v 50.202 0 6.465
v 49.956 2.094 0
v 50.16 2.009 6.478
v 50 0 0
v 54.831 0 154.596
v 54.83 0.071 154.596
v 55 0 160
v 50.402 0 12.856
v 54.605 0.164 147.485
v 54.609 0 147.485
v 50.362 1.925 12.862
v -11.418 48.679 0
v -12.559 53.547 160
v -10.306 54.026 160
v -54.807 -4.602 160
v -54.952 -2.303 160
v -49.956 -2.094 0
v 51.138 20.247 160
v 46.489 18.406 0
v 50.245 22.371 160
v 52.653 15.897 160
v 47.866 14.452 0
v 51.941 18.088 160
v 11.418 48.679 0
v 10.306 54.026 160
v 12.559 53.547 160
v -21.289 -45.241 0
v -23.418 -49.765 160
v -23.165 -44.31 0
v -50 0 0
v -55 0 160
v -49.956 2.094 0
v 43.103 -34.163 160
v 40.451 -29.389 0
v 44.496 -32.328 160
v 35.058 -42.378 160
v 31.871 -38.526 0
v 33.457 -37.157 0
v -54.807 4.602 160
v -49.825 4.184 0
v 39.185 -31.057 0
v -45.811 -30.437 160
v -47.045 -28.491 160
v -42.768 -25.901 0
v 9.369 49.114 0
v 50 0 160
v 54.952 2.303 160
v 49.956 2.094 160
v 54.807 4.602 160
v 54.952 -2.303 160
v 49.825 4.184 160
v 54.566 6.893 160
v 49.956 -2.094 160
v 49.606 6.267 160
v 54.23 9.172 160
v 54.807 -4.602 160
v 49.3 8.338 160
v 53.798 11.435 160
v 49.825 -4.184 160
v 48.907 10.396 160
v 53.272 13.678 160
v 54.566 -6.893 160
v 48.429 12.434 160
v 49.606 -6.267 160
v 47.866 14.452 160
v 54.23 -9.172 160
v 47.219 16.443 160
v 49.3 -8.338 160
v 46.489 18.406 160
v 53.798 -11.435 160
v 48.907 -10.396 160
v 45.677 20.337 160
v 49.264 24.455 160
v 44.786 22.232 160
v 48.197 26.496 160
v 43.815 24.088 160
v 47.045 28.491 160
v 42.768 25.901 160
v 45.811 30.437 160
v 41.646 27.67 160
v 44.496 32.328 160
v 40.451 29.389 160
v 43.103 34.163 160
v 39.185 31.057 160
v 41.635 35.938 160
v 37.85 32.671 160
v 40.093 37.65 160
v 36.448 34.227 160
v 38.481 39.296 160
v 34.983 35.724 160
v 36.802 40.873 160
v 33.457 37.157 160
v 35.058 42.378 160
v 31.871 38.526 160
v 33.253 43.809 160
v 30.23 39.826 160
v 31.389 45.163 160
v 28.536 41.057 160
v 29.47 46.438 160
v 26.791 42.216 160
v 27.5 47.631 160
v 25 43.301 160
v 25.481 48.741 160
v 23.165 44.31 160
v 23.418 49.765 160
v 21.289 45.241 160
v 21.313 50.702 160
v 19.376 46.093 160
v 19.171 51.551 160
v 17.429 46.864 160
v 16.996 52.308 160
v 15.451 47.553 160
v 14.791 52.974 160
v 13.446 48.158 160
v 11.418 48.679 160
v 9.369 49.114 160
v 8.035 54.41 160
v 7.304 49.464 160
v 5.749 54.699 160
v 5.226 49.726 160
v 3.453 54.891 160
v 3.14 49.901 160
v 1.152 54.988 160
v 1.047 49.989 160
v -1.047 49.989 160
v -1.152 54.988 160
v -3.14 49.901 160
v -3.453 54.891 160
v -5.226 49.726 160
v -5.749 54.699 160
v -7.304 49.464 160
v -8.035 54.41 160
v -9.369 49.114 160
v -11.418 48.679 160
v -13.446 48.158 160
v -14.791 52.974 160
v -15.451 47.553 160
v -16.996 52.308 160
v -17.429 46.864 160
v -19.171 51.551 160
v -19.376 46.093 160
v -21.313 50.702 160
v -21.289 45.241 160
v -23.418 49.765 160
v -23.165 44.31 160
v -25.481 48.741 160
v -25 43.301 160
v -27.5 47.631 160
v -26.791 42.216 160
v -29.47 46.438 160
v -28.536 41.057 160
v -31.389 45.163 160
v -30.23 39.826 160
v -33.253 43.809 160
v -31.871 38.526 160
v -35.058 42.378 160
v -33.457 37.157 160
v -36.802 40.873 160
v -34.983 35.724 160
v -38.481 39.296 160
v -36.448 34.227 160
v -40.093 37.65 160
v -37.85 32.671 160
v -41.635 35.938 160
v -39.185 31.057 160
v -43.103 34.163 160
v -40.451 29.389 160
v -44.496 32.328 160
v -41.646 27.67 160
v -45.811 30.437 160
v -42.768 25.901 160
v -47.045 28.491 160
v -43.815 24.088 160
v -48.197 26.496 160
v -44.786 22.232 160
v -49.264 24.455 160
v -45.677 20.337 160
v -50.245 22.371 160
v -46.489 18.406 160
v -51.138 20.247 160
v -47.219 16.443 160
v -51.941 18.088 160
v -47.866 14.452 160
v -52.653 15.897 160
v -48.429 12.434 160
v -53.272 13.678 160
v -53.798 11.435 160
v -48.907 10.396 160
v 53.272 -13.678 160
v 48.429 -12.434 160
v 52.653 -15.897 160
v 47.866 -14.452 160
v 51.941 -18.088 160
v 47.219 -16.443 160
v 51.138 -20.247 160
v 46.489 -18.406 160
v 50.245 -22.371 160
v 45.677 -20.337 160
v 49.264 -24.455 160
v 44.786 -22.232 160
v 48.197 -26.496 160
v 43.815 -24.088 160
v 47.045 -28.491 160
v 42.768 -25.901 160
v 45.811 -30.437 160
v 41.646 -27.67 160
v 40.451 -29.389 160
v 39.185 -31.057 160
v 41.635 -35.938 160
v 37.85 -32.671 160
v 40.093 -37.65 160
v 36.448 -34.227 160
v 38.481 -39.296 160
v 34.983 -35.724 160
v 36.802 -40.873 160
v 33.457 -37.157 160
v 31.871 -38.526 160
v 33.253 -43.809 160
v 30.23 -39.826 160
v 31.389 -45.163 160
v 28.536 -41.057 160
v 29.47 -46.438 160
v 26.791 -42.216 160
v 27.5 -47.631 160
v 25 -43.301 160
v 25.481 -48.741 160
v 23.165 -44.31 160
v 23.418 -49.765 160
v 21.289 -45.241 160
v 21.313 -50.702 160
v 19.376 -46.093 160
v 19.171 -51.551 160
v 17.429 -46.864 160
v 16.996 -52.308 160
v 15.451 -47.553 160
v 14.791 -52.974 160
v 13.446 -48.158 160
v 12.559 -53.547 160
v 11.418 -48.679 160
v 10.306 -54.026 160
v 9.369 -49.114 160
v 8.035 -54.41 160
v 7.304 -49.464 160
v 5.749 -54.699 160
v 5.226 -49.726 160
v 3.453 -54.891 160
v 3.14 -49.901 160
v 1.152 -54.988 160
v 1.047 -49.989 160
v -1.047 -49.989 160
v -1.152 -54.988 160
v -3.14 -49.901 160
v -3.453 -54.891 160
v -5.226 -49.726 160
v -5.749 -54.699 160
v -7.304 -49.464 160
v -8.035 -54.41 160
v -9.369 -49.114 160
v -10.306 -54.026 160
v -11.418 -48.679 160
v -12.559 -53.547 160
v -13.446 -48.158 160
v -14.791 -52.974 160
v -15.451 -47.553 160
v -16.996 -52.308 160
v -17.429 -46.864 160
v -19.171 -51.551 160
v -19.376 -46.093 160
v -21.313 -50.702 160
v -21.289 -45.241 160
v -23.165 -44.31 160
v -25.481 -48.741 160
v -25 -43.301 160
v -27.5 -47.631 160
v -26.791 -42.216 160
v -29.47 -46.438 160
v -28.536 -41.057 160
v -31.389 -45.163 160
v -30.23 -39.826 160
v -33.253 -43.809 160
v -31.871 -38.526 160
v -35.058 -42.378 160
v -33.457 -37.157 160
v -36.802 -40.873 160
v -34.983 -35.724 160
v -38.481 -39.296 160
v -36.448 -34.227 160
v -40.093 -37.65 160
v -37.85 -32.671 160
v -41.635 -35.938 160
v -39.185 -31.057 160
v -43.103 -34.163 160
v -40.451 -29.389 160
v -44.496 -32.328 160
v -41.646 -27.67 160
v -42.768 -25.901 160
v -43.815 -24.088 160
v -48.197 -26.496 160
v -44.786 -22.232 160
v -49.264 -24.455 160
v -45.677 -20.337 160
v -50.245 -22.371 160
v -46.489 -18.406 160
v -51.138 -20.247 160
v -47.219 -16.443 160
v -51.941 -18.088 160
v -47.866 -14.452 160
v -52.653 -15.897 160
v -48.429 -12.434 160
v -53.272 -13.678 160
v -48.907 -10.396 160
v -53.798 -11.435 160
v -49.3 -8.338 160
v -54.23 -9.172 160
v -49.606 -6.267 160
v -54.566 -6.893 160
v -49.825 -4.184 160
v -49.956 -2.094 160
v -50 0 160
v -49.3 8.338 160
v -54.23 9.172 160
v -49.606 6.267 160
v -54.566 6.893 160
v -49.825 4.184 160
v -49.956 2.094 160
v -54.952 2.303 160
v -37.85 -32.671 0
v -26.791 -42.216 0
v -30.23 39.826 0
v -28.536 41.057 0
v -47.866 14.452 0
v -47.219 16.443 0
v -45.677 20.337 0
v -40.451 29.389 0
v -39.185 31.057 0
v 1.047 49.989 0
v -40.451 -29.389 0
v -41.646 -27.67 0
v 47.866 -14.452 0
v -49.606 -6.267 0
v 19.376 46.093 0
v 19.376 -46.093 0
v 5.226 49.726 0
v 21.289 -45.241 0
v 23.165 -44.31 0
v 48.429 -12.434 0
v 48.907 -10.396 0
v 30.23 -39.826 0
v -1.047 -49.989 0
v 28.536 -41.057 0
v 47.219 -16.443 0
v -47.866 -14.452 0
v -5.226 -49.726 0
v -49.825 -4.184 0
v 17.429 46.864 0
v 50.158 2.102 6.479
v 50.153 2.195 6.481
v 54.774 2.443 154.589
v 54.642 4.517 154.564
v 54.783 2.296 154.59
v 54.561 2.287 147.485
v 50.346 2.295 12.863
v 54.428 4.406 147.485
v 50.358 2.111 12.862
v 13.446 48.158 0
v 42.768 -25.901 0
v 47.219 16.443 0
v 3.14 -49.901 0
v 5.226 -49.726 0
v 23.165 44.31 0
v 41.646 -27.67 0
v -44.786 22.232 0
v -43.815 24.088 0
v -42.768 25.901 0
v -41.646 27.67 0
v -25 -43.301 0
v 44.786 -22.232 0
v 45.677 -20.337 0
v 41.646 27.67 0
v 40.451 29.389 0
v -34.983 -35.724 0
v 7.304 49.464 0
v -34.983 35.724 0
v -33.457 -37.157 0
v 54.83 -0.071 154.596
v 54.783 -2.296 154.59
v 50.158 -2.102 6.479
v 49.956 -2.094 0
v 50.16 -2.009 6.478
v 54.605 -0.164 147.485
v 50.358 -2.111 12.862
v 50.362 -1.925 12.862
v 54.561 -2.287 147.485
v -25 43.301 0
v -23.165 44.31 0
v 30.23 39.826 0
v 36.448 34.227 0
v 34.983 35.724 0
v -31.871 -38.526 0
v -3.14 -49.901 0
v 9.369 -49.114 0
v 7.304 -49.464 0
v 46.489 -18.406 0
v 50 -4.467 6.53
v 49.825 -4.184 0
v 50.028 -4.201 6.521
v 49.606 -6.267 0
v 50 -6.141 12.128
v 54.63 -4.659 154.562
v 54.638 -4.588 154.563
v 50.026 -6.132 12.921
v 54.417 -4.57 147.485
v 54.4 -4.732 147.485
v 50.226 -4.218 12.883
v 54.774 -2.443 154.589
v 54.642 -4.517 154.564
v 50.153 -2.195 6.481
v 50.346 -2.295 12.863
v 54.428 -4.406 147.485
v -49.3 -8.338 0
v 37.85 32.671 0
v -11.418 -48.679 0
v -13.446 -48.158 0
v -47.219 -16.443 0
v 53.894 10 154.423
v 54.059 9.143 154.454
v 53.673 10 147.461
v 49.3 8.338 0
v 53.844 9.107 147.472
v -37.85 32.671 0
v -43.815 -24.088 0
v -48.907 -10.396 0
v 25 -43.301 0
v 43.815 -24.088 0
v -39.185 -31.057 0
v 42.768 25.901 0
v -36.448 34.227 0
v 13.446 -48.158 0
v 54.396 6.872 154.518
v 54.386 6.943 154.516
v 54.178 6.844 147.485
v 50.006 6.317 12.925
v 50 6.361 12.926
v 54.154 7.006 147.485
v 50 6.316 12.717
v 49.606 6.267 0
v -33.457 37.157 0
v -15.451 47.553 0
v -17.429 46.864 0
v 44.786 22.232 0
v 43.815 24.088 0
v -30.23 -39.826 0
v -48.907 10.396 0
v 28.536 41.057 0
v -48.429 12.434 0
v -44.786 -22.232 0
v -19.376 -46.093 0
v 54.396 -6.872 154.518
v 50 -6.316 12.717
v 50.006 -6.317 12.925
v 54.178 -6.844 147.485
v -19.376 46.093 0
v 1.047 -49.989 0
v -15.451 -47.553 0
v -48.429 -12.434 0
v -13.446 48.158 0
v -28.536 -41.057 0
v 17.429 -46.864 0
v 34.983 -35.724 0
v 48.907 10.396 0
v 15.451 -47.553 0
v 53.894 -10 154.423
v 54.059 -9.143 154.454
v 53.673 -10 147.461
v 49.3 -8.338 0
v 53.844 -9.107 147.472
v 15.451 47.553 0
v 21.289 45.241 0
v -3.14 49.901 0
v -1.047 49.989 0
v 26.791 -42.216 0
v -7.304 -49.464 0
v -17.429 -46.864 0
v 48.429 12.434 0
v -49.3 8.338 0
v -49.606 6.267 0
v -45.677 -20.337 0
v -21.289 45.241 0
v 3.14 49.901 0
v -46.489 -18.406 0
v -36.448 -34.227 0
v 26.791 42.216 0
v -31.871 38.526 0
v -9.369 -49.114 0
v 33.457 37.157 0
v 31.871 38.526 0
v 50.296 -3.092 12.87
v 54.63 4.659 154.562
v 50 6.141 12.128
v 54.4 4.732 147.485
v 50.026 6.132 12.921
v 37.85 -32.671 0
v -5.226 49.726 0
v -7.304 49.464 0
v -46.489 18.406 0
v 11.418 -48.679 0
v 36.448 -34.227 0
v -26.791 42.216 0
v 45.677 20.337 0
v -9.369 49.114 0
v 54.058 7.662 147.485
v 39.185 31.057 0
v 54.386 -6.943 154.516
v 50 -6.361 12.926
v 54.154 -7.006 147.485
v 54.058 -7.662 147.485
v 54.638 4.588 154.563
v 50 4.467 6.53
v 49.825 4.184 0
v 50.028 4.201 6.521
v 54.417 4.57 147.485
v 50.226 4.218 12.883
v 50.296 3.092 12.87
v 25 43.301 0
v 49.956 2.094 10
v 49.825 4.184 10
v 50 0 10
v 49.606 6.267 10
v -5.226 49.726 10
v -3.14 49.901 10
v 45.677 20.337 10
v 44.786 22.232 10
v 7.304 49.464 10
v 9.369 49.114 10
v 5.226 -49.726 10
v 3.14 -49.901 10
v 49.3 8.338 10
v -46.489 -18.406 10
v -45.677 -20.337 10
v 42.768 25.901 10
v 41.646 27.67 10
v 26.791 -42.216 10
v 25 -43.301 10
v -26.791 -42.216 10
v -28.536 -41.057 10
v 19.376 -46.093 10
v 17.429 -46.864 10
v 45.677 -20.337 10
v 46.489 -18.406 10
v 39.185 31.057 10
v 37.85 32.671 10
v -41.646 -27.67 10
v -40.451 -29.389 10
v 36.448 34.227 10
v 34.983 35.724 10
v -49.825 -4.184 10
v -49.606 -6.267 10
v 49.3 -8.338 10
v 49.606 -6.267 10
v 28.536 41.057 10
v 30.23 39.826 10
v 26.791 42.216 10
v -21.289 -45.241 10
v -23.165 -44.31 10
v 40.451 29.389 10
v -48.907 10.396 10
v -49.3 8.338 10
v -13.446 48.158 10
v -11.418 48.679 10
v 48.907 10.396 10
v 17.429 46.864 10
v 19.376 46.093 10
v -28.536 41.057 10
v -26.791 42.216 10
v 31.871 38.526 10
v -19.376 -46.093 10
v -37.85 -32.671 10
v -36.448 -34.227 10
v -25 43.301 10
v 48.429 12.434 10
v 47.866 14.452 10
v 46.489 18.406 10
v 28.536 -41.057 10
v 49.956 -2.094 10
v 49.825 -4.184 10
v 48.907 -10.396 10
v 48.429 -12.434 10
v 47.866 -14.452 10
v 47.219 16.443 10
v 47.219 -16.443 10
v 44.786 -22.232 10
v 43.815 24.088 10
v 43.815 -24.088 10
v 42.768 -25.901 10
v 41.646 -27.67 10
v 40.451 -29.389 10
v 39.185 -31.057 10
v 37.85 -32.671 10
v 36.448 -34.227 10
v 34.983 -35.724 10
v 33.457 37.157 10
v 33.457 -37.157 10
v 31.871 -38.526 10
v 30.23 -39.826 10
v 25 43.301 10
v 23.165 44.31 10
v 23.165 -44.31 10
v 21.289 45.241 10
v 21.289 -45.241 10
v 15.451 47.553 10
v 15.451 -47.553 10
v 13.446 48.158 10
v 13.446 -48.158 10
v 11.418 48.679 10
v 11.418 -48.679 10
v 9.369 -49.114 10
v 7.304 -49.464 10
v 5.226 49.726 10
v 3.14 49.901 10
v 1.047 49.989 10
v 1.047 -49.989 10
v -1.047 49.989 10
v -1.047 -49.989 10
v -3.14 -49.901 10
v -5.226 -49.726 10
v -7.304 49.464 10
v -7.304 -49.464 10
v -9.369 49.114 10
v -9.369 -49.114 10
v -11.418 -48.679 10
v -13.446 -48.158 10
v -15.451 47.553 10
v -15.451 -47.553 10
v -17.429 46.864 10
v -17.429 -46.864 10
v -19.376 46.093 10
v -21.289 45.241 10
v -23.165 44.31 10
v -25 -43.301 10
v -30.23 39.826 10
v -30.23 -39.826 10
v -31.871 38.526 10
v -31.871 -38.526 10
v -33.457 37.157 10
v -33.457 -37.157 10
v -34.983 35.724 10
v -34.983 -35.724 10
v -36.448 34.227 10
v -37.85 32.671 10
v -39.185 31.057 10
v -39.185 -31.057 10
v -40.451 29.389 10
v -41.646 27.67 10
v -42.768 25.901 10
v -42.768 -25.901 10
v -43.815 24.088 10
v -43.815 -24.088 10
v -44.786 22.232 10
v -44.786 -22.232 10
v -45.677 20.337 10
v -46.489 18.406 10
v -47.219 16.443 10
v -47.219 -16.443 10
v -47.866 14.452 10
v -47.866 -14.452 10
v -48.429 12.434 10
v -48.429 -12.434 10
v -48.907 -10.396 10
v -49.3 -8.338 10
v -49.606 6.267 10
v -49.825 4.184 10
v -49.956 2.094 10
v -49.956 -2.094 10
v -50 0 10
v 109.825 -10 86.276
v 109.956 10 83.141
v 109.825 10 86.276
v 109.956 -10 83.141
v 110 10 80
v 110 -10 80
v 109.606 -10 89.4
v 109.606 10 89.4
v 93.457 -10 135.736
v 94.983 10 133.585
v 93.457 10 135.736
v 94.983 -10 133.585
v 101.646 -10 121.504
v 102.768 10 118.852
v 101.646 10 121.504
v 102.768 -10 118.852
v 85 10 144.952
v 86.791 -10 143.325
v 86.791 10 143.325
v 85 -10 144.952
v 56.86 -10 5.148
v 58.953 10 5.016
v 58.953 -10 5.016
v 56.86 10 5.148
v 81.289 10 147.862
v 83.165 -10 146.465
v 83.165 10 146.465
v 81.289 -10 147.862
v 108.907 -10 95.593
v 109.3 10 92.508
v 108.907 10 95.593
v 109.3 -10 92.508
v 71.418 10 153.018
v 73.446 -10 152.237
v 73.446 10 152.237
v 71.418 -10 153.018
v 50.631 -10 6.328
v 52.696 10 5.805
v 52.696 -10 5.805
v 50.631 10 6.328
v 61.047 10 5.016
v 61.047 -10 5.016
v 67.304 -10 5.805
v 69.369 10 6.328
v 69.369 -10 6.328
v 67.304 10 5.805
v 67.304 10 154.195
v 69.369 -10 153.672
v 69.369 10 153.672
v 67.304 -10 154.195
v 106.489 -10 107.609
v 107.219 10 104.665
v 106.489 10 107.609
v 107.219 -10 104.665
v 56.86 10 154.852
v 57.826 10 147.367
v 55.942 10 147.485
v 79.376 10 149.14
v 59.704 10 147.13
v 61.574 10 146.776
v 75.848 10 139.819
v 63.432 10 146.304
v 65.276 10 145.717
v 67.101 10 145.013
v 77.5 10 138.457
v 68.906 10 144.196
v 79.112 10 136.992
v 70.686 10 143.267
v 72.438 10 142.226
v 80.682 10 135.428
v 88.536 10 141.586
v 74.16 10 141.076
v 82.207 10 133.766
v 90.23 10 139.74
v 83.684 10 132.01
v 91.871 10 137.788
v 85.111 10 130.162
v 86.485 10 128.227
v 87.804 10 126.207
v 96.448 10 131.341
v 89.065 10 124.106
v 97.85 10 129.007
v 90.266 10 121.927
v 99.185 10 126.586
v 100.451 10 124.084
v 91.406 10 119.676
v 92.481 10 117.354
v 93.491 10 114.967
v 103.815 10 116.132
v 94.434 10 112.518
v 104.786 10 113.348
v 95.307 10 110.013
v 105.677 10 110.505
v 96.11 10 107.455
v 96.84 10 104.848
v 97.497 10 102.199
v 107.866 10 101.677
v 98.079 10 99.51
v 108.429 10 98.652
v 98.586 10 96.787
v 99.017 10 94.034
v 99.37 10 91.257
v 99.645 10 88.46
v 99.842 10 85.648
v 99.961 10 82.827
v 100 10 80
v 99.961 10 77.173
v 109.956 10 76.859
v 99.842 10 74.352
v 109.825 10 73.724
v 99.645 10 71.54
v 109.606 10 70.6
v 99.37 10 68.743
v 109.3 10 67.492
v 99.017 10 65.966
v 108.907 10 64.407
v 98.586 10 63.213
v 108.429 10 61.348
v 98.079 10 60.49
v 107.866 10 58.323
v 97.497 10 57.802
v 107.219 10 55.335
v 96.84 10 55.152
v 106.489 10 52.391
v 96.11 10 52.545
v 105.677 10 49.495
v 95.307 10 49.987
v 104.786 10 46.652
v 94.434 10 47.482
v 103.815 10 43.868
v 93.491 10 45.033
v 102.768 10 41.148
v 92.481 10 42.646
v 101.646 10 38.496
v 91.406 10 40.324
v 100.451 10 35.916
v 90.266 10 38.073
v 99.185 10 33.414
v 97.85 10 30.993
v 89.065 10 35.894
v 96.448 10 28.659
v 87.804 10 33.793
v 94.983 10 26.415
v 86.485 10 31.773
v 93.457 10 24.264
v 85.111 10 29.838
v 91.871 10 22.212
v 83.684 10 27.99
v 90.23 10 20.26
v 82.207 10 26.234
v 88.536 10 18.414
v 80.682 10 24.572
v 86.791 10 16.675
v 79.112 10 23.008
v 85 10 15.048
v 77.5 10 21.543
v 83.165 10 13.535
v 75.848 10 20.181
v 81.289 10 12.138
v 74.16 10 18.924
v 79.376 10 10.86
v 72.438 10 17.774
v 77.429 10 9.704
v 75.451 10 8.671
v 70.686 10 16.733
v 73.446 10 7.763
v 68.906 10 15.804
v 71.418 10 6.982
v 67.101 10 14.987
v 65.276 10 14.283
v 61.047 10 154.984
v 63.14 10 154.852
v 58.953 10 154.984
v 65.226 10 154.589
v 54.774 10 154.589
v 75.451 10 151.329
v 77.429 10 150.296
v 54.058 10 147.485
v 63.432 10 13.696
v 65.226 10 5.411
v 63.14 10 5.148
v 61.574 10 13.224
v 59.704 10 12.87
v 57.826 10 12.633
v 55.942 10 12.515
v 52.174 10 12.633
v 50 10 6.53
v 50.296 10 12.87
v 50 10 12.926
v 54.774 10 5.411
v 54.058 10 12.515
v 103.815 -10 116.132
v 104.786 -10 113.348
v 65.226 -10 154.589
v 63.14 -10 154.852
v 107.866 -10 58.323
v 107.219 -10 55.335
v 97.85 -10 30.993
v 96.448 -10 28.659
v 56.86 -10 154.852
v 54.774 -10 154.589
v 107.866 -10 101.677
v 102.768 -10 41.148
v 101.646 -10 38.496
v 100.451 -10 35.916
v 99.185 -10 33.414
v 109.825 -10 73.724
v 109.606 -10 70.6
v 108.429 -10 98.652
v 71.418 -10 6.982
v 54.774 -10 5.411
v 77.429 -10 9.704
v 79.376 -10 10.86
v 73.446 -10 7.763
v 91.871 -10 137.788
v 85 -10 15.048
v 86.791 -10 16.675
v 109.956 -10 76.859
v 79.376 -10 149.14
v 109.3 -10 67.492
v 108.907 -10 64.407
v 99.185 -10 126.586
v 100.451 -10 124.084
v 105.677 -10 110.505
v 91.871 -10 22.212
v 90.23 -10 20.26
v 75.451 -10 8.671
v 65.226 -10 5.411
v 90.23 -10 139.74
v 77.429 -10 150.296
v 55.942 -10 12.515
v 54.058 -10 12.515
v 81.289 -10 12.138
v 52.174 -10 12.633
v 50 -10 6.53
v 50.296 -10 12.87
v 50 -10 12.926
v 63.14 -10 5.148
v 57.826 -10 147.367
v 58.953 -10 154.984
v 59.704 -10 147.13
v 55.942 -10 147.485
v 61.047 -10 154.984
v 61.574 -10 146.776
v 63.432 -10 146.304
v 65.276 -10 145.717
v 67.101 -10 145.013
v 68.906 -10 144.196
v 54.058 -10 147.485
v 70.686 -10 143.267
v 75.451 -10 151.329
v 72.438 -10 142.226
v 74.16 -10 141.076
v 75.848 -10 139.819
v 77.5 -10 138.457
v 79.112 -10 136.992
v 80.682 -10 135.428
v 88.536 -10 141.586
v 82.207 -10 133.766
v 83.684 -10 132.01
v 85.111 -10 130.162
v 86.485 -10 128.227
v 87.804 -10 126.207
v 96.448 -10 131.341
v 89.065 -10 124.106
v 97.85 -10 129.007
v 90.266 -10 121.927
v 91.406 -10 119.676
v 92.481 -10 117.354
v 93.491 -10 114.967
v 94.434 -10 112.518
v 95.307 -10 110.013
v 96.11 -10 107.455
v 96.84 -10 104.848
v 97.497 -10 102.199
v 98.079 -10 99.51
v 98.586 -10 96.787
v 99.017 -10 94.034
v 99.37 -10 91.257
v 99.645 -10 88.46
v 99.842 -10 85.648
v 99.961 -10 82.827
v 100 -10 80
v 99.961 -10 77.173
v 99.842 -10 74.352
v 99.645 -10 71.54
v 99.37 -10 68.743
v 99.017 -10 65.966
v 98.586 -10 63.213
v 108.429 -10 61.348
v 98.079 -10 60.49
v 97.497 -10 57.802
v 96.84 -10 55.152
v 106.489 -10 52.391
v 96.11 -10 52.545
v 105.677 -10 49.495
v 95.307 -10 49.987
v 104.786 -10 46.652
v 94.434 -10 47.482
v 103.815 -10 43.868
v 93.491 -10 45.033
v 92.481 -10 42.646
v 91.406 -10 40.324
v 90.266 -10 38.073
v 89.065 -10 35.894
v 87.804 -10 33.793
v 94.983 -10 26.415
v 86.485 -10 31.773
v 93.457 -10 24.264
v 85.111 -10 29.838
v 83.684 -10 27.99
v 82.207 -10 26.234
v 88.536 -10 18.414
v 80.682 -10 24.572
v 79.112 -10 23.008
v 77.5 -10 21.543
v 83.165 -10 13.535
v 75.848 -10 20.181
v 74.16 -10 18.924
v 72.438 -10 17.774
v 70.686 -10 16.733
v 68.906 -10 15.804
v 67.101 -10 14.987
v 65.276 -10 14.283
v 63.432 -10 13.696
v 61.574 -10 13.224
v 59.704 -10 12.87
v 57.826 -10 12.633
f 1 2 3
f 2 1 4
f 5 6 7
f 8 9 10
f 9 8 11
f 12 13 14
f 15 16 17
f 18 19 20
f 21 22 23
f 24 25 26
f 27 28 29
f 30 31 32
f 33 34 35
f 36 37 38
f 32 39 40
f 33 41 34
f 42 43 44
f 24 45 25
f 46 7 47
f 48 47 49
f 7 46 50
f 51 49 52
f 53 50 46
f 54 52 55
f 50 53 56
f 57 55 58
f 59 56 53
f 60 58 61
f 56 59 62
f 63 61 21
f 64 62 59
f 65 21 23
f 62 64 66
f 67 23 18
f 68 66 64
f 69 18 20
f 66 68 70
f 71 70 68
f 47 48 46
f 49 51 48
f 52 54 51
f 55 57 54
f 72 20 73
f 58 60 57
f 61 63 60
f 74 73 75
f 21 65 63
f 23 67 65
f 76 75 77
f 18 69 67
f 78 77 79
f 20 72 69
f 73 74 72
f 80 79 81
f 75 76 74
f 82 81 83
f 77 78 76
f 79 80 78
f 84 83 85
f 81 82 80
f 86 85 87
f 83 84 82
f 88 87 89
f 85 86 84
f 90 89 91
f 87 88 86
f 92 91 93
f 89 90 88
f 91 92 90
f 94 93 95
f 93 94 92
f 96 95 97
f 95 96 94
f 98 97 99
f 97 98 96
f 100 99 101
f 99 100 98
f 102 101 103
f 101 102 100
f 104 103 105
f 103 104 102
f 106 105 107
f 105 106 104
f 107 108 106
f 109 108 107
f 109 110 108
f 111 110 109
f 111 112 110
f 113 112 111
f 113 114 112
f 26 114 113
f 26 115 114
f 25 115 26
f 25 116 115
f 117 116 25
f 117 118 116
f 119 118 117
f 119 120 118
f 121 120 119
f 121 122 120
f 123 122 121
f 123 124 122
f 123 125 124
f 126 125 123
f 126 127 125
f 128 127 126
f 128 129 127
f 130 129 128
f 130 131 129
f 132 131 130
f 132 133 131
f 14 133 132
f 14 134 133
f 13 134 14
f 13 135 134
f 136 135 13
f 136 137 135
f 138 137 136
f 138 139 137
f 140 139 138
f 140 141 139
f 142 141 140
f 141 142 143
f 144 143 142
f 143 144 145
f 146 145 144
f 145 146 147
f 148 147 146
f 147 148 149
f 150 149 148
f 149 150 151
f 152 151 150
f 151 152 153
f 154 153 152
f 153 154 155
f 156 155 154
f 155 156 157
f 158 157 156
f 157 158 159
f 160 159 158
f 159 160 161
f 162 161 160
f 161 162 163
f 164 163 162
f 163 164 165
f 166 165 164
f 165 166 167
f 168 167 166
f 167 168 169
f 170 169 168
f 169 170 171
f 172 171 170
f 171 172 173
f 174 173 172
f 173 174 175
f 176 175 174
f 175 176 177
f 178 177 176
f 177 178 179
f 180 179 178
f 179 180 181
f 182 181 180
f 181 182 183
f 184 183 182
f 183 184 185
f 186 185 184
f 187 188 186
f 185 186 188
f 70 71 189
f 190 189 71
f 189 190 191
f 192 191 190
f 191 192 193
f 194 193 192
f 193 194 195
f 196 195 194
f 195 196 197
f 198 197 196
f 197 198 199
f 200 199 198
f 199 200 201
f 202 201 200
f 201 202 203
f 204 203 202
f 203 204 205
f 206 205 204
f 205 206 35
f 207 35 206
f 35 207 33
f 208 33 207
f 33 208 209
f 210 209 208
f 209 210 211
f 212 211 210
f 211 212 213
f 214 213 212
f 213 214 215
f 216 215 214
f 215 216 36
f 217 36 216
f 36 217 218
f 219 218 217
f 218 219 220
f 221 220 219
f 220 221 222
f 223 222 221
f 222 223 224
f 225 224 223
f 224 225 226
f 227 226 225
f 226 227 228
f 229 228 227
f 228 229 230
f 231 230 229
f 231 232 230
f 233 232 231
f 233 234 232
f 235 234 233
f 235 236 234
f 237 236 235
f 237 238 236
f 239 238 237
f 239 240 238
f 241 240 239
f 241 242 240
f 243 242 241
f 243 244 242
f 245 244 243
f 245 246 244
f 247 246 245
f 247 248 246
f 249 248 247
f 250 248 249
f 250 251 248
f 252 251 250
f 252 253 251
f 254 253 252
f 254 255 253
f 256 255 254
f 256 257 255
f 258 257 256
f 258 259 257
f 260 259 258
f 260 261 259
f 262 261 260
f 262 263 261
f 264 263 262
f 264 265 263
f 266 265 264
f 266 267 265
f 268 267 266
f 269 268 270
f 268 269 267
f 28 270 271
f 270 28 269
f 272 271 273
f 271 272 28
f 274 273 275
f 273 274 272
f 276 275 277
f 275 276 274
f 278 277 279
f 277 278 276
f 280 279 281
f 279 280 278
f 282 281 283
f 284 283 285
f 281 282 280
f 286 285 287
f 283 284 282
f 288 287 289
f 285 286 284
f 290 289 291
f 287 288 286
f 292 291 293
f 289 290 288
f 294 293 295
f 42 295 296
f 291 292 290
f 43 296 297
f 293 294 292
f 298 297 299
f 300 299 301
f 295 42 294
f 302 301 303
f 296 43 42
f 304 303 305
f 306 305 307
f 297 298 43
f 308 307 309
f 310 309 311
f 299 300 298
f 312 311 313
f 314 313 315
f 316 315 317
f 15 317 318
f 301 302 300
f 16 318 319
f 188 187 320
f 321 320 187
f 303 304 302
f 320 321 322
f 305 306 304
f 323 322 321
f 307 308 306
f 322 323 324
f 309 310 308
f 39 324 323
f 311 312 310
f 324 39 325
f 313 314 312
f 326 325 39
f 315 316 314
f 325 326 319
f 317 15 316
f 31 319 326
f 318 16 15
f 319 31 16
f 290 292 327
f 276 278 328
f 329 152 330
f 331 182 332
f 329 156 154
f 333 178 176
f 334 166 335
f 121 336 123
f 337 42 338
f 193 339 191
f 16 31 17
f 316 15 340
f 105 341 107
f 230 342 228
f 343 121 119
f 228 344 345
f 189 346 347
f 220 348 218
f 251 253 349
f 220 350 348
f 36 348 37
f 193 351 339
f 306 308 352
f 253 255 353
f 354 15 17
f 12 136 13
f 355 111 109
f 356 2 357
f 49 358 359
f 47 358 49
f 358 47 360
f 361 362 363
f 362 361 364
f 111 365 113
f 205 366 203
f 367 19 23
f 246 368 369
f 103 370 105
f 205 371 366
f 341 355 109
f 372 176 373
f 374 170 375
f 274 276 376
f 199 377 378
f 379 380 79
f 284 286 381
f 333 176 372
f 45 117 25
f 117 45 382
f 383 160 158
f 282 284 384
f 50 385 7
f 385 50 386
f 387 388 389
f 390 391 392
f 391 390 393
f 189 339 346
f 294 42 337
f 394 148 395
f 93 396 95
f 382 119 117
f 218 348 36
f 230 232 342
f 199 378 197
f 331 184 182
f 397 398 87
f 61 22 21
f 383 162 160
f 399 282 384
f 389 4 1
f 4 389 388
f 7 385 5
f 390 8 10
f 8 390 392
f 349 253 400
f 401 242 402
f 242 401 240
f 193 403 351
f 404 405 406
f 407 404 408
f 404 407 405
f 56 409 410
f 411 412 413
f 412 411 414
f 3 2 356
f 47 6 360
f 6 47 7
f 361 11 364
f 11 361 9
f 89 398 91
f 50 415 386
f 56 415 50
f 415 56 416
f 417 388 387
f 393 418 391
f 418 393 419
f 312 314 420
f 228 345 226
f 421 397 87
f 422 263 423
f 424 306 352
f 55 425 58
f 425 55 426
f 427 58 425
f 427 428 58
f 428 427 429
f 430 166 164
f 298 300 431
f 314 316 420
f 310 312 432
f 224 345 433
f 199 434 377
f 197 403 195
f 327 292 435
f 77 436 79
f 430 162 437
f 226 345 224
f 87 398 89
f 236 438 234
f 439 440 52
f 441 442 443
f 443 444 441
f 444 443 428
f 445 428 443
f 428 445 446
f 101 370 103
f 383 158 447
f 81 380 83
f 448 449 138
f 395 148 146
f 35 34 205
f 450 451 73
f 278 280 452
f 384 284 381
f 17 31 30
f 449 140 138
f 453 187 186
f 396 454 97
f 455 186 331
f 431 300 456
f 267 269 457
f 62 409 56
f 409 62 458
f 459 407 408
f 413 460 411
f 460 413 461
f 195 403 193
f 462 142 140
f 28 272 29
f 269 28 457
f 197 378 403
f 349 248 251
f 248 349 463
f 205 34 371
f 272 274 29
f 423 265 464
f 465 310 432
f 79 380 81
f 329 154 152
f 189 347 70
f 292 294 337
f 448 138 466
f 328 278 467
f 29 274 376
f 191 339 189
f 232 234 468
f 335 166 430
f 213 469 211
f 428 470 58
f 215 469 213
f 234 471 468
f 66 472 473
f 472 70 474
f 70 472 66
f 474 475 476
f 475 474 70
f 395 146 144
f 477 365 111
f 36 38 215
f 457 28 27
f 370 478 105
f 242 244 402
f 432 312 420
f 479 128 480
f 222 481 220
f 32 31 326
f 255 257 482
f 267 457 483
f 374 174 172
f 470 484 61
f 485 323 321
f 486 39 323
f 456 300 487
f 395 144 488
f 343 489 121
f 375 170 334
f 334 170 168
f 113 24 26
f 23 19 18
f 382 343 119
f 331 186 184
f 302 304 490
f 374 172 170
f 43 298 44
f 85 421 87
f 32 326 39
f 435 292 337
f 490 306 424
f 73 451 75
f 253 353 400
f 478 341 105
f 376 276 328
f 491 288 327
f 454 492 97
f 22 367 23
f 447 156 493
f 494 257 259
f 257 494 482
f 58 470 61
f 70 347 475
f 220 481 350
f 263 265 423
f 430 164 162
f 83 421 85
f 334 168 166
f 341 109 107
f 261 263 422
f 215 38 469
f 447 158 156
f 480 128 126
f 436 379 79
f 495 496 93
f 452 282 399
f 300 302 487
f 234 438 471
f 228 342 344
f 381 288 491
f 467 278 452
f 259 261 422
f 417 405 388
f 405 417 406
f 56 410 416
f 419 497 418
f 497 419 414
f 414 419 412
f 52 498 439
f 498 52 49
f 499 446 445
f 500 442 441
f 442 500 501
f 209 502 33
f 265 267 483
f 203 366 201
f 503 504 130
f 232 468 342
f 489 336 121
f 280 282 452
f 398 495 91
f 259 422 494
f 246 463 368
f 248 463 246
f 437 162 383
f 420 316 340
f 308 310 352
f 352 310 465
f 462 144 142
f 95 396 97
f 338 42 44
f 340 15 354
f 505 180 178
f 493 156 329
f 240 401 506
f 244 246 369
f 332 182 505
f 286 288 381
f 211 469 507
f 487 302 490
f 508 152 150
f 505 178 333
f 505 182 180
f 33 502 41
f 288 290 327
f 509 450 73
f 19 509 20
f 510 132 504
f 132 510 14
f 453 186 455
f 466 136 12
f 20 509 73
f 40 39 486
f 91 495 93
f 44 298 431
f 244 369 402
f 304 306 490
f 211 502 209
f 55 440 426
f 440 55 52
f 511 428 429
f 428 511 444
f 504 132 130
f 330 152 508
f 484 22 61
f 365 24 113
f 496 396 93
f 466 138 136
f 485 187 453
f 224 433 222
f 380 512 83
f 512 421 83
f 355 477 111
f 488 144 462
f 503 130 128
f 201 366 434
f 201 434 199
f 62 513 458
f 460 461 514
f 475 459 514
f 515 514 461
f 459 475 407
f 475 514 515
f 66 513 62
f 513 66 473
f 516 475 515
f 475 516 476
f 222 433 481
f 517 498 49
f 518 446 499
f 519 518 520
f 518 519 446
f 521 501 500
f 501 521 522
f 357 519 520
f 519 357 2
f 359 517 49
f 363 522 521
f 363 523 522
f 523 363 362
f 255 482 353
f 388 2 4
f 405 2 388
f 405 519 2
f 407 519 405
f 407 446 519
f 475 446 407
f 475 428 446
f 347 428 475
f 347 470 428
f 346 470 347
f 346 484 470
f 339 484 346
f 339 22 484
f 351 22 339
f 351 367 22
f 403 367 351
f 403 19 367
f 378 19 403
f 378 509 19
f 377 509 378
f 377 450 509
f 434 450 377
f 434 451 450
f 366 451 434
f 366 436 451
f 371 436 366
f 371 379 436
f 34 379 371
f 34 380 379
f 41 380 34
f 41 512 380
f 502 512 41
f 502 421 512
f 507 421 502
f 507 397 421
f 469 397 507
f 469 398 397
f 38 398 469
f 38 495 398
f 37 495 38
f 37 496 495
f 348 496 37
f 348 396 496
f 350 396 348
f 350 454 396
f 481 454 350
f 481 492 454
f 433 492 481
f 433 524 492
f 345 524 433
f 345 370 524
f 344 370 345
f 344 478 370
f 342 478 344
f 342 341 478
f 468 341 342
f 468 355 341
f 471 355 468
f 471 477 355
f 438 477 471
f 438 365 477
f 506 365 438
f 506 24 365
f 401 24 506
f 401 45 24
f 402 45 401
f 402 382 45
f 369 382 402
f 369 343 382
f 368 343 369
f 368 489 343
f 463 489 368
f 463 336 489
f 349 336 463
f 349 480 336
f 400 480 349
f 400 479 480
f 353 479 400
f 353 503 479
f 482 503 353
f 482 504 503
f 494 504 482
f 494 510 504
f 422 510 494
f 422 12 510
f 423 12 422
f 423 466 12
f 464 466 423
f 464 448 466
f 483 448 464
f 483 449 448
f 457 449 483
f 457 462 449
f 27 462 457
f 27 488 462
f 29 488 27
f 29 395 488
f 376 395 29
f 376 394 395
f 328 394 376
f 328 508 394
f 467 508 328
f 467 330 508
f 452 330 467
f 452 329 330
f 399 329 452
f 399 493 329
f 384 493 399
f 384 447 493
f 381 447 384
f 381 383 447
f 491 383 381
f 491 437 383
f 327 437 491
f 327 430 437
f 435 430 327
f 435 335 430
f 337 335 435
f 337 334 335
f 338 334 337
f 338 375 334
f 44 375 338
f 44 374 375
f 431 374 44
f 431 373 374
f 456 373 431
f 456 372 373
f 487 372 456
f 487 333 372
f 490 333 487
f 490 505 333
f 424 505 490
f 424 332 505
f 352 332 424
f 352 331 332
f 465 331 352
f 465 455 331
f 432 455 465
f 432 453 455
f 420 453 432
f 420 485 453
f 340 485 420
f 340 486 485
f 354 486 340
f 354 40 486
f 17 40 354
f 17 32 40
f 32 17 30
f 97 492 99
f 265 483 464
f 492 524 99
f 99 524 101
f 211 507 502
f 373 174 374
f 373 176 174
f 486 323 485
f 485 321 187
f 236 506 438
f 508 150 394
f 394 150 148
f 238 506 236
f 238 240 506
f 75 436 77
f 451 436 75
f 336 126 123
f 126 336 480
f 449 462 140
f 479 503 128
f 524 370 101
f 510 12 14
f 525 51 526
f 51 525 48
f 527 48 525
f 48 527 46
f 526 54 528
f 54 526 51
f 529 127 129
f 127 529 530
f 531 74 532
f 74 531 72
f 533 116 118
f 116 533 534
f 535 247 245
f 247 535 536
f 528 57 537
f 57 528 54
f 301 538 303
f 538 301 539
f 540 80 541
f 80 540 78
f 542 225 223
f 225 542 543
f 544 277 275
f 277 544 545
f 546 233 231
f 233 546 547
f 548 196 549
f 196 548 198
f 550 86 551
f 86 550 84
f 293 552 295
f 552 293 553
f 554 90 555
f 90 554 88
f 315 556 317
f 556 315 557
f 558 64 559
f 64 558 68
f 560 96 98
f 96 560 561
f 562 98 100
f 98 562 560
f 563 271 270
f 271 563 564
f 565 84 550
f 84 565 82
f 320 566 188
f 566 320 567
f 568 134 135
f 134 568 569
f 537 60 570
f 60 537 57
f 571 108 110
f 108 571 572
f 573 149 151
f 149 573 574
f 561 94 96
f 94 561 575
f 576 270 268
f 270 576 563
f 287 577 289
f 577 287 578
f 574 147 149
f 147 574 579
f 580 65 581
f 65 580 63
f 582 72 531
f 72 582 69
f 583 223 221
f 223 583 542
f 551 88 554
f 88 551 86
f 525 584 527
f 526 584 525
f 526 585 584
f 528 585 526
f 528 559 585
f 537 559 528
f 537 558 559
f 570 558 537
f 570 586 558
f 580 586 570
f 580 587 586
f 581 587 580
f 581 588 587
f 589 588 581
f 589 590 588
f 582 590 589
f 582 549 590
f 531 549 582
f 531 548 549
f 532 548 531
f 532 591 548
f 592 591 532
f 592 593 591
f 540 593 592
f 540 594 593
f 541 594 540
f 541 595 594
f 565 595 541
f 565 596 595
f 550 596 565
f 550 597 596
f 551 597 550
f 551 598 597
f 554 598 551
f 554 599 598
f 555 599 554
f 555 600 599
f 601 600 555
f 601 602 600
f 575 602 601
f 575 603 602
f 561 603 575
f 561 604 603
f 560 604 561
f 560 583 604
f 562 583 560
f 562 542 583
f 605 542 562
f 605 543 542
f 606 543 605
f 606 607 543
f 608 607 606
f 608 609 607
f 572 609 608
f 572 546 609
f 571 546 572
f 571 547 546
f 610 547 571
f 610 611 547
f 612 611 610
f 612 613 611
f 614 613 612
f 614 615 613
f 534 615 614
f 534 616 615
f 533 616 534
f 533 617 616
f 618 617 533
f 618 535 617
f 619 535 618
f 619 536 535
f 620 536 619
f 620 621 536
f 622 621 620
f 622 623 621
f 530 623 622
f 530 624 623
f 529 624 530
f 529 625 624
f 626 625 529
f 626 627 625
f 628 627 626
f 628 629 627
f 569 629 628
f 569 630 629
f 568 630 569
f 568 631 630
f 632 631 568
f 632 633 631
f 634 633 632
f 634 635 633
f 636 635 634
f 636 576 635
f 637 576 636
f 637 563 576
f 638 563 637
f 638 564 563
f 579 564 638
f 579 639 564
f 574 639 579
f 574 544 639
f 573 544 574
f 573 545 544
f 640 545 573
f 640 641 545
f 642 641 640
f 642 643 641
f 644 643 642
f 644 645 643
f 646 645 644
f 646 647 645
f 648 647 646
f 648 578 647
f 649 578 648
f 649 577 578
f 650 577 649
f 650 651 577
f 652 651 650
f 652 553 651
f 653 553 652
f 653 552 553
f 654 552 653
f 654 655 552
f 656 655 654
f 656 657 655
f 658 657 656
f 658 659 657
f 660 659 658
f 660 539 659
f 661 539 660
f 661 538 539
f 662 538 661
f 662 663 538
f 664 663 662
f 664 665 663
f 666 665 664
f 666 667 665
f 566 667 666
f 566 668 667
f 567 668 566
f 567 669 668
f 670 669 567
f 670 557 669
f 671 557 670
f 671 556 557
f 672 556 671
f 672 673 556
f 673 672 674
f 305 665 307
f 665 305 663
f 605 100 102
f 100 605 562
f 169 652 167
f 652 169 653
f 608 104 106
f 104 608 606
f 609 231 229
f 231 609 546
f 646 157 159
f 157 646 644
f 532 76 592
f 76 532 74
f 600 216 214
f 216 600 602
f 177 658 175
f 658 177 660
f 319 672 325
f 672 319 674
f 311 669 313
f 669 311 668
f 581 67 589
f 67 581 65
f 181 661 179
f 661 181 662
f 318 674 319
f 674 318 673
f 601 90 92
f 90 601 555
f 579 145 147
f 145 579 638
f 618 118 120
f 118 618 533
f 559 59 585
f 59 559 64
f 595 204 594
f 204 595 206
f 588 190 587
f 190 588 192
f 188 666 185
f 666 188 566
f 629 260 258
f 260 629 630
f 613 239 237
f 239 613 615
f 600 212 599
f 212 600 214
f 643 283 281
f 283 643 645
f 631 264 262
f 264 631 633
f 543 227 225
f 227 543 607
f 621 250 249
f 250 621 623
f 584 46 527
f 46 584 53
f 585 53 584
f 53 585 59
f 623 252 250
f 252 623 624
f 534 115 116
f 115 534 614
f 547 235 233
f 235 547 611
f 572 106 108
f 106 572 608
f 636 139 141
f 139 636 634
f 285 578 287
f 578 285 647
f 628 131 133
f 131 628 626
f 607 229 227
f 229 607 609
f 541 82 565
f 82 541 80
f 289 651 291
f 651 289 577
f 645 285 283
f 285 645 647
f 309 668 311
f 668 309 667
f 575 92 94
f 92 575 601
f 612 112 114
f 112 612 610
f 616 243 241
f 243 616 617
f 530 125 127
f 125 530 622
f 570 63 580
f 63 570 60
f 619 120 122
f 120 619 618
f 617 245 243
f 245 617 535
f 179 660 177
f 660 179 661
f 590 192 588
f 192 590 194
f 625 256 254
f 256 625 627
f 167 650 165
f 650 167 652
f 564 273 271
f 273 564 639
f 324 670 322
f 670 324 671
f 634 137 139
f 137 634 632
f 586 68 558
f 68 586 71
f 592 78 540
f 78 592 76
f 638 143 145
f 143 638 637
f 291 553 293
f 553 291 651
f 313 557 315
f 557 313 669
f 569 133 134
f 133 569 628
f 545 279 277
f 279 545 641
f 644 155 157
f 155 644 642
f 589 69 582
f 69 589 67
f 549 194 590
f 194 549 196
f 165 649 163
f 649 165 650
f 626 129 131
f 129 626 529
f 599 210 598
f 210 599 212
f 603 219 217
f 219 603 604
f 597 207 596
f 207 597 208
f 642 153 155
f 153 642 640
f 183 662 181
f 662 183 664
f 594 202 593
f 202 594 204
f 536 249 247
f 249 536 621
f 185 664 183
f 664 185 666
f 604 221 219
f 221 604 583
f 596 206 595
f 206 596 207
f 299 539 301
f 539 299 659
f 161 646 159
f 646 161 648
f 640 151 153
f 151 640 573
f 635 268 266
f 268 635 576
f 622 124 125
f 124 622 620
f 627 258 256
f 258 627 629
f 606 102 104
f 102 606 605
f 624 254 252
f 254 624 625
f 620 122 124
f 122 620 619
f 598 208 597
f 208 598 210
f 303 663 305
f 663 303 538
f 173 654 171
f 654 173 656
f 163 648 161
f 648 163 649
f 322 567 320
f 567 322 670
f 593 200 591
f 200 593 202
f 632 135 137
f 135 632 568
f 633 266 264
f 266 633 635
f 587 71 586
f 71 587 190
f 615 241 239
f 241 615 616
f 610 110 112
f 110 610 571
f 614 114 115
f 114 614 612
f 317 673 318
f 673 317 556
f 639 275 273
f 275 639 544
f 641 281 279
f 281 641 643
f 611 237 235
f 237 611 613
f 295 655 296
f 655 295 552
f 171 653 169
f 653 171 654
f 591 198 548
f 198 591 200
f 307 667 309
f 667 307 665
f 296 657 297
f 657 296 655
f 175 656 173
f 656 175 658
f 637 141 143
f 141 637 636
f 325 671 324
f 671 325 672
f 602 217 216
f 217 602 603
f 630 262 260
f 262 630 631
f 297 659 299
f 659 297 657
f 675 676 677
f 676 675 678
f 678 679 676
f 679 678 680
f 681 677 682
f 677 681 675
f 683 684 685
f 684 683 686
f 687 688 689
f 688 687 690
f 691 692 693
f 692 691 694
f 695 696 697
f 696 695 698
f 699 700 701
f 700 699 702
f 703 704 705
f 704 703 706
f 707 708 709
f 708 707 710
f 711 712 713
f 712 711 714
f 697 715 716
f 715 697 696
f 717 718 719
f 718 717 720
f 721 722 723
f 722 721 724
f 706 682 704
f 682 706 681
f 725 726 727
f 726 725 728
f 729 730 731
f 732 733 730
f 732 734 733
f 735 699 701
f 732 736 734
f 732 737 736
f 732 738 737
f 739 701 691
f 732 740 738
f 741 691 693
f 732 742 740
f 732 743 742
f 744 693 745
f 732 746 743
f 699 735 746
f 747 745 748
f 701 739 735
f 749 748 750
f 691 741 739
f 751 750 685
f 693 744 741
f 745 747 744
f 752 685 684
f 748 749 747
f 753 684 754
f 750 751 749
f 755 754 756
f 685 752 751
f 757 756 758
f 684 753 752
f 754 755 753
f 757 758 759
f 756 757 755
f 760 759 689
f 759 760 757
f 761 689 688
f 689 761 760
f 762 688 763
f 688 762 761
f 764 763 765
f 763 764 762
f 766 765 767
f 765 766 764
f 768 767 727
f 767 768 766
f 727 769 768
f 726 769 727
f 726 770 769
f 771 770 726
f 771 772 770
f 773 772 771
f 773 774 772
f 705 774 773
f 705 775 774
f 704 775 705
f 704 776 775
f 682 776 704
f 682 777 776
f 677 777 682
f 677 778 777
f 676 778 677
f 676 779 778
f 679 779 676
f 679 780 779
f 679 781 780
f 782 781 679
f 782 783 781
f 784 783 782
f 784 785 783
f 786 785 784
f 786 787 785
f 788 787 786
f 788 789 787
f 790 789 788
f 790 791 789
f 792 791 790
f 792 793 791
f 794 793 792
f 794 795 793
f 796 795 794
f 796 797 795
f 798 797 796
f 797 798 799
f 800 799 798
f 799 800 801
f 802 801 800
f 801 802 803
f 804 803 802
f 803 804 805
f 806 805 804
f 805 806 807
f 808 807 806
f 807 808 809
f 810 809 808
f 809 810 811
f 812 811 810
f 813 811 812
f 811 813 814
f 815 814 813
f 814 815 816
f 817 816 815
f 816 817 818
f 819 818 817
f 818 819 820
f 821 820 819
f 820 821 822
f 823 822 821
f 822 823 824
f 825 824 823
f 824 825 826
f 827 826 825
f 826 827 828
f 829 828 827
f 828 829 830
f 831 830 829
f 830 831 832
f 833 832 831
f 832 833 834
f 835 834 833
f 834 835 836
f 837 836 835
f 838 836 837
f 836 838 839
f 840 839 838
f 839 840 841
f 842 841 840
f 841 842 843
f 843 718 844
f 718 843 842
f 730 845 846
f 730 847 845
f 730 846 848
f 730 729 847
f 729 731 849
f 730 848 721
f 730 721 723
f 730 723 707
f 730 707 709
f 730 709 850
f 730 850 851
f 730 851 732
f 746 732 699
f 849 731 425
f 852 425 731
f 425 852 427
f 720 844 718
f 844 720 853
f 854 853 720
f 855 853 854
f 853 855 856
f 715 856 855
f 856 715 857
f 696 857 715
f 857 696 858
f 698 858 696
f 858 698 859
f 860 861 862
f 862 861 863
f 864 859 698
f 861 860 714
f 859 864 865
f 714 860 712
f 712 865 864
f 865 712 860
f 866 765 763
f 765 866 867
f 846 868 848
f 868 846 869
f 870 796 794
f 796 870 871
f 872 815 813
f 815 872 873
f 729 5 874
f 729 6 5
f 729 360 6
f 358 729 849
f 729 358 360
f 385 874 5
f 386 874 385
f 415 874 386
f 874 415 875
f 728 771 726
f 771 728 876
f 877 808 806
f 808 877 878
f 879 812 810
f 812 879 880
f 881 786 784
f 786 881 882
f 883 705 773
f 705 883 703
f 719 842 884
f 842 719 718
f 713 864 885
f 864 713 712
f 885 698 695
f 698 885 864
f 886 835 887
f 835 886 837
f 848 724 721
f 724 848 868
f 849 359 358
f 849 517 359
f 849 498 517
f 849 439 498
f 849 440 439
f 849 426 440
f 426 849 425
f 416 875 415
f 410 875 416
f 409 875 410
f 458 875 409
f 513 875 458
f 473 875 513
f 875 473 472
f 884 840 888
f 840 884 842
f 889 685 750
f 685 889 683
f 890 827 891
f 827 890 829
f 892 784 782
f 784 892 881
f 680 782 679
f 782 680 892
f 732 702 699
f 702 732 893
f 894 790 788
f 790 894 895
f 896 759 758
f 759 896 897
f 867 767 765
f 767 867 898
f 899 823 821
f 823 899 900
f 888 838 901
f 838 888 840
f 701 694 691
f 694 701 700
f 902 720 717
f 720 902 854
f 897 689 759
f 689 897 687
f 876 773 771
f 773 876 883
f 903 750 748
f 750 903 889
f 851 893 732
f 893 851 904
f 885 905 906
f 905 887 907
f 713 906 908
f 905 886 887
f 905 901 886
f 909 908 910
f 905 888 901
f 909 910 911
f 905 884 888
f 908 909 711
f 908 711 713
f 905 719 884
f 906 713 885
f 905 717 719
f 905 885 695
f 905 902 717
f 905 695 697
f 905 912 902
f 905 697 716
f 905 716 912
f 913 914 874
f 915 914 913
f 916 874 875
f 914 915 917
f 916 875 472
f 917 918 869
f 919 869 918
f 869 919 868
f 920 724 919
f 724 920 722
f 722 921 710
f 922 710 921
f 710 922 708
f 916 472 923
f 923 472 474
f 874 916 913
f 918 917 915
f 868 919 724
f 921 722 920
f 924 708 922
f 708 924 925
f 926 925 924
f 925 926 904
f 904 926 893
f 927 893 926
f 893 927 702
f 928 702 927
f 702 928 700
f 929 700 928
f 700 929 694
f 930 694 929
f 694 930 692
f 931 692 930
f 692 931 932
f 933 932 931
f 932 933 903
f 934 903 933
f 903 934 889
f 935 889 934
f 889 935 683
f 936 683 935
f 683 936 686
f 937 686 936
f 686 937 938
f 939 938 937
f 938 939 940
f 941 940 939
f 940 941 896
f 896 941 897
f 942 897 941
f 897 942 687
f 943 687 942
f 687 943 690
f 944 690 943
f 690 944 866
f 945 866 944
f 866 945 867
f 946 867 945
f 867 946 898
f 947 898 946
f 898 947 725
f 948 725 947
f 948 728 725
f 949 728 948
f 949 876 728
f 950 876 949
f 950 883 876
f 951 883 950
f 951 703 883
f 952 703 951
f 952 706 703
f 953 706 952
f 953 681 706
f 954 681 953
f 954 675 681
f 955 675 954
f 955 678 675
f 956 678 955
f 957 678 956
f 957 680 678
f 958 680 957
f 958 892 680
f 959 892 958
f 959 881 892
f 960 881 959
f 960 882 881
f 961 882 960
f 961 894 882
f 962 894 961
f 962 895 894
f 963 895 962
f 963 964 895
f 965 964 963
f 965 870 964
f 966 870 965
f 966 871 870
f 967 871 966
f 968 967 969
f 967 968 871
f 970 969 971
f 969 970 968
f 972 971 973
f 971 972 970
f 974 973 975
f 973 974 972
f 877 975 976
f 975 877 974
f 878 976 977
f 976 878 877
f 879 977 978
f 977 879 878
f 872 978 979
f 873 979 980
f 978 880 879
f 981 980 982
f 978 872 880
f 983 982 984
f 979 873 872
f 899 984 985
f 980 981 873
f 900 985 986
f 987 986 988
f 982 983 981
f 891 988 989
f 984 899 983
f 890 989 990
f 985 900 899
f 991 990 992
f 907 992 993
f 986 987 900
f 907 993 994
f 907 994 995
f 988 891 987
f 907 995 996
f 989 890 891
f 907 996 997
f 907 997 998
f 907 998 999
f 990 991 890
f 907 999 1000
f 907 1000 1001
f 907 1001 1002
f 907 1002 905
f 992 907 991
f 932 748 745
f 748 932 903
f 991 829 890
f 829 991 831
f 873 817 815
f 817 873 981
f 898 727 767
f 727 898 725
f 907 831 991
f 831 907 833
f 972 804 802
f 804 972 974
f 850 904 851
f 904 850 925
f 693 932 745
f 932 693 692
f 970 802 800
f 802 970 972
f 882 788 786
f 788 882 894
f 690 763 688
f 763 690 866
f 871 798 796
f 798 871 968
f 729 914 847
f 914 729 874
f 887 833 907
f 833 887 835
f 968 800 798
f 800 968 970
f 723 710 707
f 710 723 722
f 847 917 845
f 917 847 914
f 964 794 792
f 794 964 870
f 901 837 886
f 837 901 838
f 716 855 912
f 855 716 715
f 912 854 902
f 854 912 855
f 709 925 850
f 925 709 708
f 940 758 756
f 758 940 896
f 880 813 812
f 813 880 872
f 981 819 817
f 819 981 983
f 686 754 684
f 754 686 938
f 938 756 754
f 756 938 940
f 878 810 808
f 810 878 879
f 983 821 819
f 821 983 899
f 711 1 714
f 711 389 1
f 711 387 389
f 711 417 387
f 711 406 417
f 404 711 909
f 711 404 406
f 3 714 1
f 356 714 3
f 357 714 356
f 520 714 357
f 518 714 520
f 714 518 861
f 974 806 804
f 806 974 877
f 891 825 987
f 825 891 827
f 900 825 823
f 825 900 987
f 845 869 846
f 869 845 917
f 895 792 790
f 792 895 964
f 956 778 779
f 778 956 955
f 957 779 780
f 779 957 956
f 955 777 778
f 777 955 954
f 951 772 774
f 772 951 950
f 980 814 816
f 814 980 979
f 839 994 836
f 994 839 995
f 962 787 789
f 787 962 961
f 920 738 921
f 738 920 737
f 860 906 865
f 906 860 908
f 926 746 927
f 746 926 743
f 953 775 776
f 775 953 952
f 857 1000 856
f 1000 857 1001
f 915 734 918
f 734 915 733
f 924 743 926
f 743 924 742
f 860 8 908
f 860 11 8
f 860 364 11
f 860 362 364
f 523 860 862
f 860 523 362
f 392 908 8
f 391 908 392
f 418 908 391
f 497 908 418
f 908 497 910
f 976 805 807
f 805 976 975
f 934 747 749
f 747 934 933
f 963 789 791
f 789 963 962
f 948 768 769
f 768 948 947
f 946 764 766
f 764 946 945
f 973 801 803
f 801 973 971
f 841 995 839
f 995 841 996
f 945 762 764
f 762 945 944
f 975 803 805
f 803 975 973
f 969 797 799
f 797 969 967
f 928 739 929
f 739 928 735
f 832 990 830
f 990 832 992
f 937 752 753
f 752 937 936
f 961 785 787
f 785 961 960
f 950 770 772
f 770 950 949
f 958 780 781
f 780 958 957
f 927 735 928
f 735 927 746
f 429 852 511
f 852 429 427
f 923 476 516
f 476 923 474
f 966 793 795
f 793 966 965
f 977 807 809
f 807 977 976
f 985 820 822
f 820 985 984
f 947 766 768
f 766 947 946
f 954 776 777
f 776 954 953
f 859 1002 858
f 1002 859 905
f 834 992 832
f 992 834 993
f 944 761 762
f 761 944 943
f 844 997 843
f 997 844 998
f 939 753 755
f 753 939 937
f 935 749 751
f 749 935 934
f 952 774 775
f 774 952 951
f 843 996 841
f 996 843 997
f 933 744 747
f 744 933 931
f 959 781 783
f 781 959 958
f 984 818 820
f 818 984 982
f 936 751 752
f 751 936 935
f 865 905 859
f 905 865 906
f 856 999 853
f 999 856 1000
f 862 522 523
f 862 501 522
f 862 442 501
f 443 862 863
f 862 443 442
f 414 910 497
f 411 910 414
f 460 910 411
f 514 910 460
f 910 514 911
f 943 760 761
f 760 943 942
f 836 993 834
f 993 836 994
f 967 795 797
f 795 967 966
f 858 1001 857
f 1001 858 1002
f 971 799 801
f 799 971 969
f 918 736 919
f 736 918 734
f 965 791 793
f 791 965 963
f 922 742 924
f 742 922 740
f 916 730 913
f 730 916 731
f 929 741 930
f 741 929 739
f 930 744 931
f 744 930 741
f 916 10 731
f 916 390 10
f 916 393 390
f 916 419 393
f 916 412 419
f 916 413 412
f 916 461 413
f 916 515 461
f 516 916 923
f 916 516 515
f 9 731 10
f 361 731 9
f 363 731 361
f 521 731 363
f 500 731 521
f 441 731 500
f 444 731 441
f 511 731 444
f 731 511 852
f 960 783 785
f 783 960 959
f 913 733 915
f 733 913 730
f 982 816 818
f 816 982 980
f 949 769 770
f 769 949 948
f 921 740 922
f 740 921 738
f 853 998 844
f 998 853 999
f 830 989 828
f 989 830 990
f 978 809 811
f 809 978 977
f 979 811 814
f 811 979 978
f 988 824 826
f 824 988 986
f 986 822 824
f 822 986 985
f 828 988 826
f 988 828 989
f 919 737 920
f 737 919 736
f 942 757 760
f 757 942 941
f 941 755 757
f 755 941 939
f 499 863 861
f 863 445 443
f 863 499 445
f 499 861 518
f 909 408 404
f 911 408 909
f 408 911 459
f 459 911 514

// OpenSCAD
 
 $fn=150;
 
 color([1,0,0])
cana(height=160,diametru=110);





module maner_cana();
{
color([0,0,0])
    rotate([90,0,0])
    translate([60,80,-10])
    {
    difference()
    {
       scale([1,1.5,1])
        cylinder(20,50,50);
        translate([-5,0,-5])
        scale([1,1.5,1])
        cylinder(40,45,45);
        translate([-70,-80,-5])
        cube([60,160,30]);    
        
    }
  }
}   

module cana(height,diametru)
{
    difference(){
    cylinder(160, 50,55);
    translate([0,0,10])
    cylinder(height, 50,50);
}
}
